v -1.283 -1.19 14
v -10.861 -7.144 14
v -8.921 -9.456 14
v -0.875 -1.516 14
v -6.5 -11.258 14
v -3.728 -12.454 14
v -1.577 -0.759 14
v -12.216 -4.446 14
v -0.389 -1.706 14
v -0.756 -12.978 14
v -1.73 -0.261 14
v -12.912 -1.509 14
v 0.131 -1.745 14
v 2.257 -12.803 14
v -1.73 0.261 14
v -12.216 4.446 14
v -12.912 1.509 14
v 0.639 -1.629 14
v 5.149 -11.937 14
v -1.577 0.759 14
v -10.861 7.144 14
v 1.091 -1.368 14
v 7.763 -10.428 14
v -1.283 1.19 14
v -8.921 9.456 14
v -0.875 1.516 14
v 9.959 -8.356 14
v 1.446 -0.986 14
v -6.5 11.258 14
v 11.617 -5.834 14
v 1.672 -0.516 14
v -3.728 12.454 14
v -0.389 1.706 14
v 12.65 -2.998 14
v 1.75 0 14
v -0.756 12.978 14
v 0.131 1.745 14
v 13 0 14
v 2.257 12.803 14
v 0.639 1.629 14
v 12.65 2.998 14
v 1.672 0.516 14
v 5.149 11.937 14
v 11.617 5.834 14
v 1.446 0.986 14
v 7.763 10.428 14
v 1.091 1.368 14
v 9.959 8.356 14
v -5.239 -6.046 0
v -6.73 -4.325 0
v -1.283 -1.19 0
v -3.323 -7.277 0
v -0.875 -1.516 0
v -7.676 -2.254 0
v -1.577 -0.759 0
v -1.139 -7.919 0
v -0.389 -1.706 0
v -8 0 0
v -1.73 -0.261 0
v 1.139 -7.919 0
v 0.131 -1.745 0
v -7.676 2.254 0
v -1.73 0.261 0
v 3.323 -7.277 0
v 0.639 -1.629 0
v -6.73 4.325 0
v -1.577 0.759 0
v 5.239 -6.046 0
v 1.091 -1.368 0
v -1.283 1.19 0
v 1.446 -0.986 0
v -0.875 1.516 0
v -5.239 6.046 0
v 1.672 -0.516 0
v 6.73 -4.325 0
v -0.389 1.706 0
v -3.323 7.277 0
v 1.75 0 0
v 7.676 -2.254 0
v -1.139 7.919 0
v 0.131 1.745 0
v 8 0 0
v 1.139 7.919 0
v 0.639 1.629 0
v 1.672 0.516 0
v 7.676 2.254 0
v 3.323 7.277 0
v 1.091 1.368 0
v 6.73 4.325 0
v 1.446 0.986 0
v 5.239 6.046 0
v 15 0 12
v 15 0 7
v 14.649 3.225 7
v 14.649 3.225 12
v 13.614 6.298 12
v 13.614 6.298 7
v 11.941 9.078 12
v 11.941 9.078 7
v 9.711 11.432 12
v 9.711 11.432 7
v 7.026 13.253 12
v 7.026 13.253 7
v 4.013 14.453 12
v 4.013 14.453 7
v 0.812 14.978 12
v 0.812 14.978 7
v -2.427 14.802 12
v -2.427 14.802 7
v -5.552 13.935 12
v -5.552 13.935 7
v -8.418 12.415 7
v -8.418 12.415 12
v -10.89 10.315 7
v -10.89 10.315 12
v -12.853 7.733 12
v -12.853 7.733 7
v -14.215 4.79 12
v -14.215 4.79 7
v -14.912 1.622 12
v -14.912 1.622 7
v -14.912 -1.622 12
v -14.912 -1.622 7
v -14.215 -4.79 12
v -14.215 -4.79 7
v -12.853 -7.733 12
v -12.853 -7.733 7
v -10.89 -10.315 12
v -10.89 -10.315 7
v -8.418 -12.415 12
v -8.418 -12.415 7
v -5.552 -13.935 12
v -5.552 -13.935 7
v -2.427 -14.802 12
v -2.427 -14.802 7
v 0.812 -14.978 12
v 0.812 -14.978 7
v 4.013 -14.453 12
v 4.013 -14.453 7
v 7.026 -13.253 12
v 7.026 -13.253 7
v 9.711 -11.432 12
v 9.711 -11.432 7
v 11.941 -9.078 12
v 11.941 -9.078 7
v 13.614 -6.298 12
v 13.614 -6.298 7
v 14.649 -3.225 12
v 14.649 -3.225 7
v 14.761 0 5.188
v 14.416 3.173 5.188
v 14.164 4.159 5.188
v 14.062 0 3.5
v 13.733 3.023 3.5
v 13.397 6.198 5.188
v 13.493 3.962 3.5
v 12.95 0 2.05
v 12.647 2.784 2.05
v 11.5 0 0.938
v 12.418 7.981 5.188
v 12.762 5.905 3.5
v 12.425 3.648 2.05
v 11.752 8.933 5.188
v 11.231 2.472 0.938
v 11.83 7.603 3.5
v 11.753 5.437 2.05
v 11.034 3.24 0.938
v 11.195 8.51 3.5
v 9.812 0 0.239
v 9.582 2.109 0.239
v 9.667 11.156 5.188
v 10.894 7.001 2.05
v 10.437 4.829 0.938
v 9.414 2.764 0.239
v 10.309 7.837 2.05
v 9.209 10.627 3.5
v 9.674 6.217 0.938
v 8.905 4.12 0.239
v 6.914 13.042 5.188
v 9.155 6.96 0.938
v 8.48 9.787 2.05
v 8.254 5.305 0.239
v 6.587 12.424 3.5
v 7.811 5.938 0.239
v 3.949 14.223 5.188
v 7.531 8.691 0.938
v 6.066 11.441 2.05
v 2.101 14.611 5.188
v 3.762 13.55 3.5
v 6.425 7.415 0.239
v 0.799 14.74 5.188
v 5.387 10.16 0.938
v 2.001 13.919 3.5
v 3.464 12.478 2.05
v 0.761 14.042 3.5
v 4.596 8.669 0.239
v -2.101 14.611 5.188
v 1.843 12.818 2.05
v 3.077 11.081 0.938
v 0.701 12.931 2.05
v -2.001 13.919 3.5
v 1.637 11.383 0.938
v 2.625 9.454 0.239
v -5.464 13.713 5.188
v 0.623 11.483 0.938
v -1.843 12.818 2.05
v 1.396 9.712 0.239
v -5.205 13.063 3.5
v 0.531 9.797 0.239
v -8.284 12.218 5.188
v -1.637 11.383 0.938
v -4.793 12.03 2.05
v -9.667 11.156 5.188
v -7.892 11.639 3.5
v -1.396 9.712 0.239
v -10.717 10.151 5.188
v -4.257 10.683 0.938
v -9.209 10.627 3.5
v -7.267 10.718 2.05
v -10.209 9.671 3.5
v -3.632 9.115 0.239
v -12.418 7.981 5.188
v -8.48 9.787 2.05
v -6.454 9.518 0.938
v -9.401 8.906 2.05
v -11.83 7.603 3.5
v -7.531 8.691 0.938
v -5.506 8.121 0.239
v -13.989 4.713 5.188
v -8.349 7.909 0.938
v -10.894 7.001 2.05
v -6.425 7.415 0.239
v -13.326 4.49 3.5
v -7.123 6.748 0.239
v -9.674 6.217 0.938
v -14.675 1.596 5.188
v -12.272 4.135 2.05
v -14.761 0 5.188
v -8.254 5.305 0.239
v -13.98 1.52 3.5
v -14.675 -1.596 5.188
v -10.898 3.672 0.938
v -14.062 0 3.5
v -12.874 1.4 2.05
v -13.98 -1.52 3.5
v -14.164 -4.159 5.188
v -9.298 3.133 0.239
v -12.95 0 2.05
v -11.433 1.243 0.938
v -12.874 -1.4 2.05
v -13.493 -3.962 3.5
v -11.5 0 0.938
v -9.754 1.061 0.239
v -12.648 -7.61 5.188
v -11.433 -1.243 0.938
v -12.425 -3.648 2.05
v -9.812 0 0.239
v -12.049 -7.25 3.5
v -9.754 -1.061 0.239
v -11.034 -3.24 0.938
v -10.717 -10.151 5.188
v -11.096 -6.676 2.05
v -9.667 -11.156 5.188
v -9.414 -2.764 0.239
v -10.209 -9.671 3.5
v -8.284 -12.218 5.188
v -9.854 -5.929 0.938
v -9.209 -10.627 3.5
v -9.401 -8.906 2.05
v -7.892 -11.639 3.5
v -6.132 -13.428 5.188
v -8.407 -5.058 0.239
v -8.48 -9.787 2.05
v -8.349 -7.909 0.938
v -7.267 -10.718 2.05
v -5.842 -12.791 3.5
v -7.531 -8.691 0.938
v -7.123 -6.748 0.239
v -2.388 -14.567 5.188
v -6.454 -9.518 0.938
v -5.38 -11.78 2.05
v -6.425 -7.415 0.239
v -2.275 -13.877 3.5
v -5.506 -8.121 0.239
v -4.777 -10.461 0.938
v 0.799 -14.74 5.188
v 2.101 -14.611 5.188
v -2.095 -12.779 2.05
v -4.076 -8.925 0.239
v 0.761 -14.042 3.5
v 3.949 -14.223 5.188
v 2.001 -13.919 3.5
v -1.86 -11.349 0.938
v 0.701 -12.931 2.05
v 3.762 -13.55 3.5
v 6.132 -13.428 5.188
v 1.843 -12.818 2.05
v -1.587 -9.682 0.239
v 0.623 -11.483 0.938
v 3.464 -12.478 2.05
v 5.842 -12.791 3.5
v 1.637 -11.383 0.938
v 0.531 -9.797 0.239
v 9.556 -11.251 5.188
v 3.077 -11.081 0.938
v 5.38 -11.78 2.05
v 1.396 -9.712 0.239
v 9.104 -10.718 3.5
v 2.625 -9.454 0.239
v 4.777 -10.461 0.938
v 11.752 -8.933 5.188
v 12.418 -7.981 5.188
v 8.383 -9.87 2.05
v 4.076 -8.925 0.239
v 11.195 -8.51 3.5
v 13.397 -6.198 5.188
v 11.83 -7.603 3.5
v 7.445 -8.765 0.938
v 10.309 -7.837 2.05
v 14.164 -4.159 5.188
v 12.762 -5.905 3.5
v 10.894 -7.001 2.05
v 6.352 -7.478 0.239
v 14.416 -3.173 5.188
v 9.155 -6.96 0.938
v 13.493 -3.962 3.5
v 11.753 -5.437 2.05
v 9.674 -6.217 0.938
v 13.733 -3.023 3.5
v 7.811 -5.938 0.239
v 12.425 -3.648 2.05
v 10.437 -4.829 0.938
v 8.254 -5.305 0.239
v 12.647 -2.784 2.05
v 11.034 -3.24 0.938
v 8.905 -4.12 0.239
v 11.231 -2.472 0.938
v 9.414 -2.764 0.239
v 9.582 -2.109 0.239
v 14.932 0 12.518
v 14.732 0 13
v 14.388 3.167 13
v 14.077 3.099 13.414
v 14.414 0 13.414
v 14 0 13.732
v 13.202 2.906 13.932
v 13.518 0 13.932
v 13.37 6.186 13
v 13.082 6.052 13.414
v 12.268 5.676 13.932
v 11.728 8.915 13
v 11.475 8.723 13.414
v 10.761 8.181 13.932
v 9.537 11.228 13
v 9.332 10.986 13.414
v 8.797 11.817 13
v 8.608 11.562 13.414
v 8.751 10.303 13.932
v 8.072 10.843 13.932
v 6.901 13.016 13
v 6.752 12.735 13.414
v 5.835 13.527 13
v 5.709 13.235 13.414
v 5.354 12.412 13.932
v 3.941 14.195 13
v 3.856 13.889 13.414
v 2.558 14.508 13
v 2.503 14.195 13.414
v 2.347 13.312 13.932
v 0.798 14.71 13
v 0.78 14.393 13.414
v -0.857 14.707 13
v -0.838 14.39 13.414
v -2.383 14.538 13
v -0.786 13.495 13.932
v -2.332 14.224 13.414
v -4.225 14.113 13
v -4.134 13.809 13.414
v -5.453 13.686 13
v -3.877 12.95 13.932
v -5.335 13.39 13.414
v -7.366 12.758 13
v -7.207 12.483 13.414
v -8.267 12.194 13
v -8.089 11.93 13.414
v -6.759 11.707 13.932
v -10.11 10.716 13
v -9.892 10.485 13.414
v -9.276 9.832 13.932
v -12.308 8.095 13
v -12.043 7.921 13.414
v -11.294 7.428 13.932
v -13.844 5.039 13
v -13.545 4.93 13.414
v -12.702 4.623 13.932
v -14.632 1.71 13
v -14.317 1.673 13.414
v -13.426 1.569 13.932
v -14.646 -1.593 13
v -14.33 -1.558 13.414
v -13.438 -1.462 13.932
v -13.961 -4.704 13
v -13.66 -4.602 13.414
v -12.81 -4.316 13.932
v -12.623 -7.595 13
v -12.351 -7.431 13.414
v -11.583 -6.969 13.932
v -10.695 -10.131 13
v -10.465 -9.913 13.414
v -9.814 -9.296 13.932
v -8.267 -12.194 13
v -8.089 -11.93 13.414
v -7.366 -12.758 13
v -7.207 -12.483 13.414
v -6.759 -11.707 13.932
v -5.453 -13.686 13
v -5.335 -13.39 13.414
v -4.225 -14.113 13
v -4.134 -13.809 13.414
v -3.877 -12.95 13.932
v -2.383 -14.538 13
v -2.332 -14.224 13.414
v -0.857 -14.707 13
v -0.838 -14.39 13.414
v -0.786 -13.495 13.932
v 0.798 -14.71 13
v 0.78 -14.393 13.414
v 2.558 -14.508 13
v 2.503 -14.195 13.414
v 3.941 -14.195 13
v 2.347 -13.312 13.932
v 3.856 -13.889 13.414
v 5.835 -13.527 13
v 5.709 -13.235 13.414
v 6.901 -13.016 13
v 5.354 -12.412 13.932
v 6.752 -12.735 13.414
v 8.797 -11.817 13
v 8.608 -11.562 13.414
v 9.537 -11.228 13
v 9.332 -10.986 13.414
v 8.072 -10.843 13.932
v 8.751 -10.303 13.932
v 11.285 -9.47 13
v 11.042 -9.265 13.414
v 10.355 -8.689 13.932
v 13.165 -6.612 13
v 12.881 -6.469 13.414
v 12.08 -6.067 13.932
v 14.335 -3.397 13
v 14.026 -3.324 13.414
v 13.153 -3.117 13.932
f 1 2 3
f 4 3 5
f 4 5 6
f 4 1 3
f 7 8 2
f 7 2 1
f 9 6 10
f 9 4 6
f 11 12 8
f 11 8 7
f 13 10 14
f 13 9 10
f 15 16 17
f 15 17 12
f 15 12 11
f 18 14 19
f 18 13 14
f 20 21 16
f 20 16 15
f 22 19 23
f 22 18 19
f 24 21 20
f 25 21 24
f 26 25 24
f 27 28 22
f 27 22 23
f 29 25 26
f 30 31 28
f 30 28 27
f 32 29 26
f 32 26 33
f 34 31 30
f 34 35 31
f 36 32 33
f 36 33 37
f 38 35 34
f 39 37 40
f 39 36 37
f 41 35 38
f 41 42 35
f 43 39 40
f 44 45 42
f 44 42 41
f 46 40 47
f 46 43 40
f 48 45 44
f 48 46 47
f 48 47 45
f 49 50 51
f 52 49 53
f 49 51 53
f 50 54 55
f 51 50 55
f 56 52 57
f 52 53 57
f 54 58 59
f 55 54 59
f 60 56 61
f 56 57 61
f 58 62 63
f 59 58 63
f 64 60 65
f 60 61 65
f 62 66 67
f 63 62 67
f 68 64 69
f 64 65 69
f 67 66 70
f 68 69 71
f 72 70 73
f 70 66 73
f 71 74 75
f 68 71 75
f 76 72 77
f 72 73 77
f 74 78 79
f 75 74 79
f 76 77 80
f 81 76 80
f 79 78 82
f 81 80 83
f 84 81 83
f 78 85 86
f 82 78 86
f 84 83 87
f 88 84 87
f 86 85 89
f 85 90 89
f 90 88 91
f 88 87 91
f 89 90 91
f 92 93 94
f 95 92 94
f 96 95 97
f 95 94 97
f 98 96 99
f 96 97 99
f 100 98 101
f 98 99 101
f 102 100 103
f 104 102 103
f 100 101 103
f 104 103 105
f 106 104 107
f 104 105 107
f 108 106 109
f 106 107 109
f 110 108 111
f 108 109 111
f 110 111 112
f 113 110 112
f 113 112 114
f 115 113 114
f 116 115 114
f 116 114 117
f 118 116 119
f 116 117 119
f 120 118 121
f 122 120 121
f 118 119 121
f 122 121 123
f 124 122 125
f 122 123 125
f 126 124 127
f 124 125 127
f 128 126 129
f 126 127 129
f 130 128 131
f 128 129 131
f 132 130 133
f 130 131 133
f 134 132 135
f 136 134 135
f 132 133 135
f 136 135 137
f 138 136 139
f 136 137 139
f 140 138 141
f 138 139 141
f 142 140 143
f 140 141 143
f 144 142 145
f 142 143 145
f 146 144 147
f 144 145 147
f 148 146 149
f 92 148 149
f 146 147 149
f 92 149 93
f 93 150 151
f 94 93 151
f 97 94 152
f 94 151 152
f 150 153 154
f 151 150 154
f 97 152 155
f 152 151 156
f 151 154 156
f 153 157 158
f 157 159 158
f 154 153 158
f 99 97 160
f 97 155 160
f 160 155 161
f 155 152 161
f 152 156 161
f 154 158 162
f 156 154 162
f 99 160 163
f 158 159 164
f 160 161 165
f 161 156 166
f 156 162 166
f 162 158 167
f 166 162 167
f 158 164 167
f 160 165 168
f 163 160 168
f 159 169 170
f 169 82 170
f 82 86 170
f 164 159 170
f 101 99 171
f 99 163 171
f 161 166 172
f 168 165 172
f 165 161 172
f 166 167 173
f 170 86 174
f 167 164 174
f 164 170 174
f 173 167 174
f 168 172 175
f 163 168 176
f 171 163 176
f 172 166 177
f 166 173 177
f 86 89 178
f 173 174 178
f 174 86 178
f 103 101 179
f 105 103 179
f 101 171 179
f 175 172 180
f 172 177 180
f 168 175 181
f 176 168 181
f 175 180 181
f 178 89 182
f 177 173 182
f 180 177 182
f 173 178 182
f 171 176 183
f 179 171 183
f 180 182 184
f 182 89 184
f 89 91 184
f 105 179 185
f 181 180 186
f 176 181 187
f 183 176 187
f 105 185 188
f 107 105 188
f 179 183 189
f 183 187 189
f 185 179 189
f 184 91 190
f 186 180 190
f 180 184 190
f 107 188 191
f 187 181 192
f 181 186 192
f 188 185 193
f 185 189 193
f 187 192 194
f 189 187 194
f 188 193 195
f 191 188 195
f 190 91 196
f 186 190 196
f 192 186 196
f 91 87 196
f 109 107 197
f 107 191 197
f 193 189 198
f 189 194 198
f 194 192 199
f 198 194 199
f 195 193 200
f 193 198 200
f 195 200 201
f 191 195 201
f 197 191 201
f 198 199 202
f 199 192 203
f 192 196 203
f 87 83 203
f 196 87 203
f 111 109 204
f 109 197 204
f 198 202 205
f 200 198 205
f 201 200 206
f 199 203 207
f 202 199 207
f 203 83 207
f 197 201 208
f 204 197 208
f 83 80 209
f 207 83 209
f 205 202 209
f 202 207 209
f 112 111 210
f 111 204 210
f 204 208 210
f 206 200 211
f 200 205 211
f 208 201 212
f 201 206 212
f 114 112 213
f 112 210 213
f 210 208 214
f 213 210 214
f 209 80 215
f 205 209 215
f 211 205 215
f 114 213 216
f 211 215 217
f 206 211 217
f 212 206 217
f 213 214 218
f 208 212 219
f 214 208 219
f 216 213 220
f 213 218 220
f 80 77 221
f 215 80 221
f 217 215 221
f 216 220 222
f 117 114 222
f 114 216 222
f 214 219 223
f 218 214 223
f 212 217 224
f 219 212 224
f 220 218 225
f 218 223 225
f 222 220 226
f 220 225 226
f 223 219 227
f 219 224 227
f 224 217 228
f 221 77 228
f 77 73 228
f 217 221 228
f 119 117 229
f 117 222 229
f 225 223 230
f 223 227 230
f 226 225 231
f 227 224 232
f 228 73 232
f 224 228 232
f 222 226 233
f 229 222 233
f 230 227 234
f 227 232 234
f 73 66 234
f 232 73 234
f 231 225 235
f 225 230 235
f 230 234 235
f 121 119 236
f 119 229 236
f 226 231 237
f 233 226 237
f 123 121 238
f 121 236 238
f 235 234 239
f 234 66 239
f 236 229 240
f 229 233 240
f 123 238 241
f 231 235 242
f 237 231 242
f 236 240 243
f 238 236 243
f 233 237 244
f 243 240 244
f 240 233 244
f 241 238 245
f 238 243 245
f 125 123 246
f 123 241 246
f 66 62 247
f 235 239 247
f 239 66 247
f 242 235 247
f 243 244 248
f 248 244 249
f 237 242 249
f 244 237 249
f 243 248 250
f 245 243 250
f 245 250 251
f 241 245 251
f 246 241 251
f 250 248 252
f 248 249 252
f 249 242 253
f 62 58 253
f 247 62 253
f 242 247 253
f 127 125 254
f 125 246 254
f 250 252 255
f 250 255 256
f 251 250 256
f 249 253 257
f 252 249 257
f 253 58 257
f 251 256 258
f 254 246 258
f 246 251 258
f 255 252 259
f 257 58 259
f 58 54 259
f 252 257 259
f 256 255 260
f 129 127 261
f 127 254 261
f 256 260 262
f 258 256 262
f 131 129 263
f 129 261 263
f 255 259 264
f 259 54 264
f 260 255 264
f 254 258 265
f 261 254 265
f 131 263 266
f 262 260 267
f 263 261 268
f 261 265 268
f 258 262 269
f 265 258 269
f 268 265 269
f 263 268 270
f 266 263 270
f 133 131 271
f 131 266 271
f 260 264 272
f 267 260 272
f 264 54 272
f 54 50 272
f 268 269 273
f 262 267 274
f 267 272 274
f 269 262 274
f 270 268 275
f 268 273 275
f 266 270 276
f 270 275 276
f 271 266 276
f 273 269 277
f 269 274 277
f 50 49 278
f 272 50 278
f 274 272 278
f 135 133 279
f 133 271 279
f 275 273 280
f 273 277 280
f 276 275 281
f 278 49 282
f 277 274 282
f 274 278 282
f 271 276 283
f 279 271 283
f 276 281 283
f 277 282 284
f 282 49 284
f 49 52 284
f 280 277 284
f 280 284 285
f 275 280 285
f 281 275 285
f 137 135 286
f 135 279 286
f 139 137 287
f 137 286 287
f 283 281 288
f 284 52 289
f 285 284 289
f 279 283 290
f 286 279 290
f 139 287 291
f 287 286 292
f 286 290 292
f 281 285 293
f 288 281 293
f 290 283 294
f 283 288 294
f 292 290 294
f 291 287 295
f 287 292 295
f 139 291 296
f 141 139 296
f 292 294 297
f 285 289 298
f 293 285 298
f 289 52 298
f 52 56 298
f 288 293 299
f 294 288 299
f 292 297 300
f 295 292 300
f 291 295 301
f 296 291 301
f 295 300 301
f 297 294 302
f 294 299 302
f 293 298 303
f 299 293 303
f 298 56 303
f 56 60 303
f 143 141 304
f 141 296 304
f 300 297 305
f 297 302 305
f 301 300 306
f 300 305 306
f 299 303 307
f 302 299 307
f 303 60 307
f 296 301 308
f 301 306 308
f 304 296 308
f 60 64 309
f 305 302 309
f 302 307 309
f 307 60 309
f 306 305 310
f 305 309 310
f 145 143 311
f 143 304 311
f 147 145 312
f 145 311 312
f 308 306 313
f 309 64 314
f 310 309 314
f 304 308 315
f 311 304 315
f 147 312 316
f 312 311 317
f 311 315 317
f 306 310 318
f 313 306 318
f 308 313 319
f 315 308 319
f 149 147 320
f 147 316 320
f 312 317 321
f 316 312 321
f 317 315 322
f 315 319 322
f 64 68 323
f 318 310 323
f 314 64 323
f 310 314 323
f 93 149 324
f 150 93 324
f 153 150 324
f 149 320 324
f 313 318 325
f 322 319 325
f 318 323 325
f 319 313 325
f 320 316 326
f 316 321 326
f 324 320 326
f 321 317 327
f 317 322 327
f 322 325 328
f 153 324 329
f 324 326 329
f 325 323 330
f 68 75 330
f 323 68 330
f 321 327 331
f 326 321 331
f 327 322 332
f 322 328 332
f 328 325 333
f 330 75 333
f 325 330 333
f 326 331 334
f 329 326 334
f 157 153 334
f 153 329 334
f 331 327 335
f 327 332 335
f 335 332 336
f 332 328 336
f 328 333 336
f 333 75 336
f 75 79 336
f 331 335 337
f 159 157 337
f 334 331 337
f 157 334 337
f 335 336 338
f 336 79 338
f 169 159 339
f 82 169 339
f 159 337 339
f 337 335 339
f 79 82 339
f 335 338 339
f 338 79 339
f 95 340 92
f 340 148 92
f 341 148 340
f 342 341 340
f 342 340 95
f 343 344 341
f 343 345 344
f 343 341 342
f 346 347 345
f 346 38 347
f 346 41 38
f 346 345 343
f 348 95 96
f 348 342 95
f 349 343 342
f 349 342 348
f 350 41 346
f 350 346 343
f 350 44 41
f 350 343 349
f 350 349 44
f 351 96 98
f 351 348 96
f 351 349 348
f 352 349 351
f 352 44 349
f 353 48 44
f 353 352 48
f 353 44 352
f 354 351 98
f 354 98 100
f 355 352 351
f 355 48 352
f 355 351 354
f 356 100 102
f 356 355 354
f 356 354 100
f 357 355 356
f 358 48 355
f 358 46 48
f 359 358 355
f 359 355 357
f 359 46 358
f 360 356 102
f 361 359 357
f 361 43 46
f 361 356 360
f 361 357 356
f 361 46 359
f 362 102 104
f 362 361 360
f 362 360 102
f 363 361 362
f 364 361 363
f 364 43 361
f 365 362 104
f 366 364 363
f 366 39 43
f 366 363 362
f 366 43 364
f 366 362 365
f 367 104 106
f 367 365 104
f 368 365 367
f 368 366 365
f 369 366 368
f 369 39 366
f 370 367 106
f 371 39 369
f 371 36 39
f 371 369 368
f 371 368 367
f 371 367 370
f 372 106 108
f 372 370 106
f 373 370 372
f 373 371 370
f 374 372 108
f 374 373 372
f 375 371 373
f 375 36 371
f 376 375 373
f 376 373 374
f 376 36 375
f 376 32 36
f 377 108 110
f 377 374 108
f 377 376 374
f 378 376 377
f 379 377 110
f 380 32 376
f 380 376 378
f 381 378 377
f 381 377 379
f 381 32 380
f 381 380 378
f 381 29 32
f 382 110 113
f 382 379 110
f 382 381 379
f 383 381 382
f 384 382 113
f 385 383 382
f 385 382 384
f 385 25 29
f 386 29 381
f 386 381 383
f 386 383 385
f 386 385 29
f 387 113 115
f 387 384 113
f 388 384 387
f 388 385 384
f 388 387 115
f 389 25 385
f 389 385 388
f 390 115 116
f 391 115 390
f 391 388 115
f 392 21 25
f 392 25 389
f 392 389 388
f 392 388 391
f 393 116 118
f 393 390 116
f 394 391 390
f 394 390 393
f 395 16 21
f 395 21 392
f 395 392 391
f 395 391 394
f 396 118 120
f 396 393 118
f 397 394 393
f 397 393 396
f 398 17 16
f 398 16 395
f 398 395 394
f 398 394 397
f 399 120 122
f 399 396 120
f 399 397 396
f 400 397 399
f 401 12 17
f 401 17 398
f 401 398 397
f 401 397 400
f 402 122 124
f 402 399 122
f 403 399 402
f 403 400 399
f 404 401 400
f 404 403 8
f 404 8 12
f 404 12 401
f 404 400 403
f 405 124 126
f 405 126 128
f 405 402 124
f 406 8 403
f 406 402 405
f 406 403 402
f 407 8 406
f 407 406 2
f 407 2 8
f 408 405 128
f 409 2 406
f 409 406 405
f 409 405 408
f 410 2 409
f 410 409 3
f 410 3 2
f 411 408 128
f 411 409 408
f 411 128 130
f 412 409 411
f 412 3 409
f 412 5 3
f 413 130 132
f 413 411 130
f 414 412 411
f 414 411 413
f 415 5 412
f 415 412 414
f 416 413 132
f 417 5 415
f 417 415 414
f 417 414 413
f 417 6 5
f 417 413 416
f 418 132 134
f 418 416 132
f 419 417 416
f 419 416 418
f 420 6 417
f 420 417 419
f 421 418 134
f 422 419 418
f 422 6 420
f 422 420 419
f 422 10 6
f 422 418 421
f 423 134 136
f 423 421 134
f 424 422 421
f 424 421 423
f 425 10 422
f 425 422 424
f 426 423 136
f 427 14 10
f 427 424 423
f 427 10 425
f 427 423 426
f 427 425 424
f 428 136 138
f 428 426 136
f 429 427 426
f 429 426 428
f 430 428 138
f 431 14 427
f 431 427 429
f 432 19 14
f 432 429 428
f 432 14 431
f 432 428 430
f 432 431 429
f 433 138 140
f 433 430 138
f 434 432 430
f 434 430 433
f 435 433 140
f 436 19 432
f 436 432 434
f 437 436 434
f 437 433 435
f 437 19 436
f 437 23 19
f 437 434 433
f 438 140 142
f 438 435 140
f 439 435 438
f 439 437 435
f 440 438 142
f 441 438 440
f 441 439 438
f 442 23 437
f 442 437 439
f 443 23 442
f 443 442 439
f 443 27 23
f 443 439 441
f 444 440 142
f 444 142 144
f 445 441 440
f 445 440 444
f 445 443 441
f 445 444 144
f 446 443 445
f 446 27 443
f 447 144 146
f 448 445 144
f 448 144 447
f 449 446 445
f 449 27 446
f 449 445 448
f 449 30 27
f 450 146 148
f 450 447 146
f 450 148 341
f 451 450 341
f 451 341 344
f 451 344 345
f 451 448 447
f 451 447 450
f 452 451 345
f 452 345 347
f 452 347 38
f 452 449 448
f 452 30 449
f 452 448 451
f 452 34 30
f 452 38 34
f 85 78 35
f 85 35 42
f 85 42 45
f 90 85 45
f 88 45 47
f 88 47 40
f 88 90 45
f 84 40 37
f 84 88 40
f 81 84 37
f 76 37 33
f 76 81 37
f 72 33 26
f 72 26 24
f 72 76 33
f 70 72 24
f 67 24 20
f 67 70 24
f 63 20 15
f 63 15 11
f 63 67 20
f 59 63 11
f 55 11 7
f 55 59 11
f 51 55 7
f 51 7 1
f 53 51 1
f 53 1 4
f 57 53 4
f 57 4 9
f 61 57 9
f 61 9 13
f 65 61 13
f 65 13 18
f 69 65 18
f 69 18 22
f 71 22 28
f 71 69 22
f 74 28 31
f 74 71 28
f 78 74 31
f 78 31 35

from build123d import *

# Parameters (mm, degrees)
SKETCH_1_R      = 15
SKETCH_1_R_2    = 1.75
EXTRUDE_1_DEPTH = 14
FILLET_1_R      = 2
FILLET_2_R      = 7


with BuildPart() as part:
    # Эскиз1 → Бобышка-Вытянуть1 (new body)
    with BuildSketch(Plane.XY):
        Circle(SKETCH_1_R)
        Circle(SKETCH_1_R_2, mode=Mode.SUBTRACT)
    extrude(amount=EXTRUDE_1_DEPTH)

    # Скругление1
    fillet_1_edges = [part.edges().sort_by_distance(p)[0] for p in [
        (-15, 0, 14),
    ]]
    fillet(fillet_1_edges, radius=FILLET_1_R)

    # Скругление2
    fillet_2_edges = [part.edges().sort_by_distance(p)[0] for p in [
        (-15, 0, 0),
    ]]
    fillet(fillet_2_edges, radius=FILLET_2_R)


solid = part.part
